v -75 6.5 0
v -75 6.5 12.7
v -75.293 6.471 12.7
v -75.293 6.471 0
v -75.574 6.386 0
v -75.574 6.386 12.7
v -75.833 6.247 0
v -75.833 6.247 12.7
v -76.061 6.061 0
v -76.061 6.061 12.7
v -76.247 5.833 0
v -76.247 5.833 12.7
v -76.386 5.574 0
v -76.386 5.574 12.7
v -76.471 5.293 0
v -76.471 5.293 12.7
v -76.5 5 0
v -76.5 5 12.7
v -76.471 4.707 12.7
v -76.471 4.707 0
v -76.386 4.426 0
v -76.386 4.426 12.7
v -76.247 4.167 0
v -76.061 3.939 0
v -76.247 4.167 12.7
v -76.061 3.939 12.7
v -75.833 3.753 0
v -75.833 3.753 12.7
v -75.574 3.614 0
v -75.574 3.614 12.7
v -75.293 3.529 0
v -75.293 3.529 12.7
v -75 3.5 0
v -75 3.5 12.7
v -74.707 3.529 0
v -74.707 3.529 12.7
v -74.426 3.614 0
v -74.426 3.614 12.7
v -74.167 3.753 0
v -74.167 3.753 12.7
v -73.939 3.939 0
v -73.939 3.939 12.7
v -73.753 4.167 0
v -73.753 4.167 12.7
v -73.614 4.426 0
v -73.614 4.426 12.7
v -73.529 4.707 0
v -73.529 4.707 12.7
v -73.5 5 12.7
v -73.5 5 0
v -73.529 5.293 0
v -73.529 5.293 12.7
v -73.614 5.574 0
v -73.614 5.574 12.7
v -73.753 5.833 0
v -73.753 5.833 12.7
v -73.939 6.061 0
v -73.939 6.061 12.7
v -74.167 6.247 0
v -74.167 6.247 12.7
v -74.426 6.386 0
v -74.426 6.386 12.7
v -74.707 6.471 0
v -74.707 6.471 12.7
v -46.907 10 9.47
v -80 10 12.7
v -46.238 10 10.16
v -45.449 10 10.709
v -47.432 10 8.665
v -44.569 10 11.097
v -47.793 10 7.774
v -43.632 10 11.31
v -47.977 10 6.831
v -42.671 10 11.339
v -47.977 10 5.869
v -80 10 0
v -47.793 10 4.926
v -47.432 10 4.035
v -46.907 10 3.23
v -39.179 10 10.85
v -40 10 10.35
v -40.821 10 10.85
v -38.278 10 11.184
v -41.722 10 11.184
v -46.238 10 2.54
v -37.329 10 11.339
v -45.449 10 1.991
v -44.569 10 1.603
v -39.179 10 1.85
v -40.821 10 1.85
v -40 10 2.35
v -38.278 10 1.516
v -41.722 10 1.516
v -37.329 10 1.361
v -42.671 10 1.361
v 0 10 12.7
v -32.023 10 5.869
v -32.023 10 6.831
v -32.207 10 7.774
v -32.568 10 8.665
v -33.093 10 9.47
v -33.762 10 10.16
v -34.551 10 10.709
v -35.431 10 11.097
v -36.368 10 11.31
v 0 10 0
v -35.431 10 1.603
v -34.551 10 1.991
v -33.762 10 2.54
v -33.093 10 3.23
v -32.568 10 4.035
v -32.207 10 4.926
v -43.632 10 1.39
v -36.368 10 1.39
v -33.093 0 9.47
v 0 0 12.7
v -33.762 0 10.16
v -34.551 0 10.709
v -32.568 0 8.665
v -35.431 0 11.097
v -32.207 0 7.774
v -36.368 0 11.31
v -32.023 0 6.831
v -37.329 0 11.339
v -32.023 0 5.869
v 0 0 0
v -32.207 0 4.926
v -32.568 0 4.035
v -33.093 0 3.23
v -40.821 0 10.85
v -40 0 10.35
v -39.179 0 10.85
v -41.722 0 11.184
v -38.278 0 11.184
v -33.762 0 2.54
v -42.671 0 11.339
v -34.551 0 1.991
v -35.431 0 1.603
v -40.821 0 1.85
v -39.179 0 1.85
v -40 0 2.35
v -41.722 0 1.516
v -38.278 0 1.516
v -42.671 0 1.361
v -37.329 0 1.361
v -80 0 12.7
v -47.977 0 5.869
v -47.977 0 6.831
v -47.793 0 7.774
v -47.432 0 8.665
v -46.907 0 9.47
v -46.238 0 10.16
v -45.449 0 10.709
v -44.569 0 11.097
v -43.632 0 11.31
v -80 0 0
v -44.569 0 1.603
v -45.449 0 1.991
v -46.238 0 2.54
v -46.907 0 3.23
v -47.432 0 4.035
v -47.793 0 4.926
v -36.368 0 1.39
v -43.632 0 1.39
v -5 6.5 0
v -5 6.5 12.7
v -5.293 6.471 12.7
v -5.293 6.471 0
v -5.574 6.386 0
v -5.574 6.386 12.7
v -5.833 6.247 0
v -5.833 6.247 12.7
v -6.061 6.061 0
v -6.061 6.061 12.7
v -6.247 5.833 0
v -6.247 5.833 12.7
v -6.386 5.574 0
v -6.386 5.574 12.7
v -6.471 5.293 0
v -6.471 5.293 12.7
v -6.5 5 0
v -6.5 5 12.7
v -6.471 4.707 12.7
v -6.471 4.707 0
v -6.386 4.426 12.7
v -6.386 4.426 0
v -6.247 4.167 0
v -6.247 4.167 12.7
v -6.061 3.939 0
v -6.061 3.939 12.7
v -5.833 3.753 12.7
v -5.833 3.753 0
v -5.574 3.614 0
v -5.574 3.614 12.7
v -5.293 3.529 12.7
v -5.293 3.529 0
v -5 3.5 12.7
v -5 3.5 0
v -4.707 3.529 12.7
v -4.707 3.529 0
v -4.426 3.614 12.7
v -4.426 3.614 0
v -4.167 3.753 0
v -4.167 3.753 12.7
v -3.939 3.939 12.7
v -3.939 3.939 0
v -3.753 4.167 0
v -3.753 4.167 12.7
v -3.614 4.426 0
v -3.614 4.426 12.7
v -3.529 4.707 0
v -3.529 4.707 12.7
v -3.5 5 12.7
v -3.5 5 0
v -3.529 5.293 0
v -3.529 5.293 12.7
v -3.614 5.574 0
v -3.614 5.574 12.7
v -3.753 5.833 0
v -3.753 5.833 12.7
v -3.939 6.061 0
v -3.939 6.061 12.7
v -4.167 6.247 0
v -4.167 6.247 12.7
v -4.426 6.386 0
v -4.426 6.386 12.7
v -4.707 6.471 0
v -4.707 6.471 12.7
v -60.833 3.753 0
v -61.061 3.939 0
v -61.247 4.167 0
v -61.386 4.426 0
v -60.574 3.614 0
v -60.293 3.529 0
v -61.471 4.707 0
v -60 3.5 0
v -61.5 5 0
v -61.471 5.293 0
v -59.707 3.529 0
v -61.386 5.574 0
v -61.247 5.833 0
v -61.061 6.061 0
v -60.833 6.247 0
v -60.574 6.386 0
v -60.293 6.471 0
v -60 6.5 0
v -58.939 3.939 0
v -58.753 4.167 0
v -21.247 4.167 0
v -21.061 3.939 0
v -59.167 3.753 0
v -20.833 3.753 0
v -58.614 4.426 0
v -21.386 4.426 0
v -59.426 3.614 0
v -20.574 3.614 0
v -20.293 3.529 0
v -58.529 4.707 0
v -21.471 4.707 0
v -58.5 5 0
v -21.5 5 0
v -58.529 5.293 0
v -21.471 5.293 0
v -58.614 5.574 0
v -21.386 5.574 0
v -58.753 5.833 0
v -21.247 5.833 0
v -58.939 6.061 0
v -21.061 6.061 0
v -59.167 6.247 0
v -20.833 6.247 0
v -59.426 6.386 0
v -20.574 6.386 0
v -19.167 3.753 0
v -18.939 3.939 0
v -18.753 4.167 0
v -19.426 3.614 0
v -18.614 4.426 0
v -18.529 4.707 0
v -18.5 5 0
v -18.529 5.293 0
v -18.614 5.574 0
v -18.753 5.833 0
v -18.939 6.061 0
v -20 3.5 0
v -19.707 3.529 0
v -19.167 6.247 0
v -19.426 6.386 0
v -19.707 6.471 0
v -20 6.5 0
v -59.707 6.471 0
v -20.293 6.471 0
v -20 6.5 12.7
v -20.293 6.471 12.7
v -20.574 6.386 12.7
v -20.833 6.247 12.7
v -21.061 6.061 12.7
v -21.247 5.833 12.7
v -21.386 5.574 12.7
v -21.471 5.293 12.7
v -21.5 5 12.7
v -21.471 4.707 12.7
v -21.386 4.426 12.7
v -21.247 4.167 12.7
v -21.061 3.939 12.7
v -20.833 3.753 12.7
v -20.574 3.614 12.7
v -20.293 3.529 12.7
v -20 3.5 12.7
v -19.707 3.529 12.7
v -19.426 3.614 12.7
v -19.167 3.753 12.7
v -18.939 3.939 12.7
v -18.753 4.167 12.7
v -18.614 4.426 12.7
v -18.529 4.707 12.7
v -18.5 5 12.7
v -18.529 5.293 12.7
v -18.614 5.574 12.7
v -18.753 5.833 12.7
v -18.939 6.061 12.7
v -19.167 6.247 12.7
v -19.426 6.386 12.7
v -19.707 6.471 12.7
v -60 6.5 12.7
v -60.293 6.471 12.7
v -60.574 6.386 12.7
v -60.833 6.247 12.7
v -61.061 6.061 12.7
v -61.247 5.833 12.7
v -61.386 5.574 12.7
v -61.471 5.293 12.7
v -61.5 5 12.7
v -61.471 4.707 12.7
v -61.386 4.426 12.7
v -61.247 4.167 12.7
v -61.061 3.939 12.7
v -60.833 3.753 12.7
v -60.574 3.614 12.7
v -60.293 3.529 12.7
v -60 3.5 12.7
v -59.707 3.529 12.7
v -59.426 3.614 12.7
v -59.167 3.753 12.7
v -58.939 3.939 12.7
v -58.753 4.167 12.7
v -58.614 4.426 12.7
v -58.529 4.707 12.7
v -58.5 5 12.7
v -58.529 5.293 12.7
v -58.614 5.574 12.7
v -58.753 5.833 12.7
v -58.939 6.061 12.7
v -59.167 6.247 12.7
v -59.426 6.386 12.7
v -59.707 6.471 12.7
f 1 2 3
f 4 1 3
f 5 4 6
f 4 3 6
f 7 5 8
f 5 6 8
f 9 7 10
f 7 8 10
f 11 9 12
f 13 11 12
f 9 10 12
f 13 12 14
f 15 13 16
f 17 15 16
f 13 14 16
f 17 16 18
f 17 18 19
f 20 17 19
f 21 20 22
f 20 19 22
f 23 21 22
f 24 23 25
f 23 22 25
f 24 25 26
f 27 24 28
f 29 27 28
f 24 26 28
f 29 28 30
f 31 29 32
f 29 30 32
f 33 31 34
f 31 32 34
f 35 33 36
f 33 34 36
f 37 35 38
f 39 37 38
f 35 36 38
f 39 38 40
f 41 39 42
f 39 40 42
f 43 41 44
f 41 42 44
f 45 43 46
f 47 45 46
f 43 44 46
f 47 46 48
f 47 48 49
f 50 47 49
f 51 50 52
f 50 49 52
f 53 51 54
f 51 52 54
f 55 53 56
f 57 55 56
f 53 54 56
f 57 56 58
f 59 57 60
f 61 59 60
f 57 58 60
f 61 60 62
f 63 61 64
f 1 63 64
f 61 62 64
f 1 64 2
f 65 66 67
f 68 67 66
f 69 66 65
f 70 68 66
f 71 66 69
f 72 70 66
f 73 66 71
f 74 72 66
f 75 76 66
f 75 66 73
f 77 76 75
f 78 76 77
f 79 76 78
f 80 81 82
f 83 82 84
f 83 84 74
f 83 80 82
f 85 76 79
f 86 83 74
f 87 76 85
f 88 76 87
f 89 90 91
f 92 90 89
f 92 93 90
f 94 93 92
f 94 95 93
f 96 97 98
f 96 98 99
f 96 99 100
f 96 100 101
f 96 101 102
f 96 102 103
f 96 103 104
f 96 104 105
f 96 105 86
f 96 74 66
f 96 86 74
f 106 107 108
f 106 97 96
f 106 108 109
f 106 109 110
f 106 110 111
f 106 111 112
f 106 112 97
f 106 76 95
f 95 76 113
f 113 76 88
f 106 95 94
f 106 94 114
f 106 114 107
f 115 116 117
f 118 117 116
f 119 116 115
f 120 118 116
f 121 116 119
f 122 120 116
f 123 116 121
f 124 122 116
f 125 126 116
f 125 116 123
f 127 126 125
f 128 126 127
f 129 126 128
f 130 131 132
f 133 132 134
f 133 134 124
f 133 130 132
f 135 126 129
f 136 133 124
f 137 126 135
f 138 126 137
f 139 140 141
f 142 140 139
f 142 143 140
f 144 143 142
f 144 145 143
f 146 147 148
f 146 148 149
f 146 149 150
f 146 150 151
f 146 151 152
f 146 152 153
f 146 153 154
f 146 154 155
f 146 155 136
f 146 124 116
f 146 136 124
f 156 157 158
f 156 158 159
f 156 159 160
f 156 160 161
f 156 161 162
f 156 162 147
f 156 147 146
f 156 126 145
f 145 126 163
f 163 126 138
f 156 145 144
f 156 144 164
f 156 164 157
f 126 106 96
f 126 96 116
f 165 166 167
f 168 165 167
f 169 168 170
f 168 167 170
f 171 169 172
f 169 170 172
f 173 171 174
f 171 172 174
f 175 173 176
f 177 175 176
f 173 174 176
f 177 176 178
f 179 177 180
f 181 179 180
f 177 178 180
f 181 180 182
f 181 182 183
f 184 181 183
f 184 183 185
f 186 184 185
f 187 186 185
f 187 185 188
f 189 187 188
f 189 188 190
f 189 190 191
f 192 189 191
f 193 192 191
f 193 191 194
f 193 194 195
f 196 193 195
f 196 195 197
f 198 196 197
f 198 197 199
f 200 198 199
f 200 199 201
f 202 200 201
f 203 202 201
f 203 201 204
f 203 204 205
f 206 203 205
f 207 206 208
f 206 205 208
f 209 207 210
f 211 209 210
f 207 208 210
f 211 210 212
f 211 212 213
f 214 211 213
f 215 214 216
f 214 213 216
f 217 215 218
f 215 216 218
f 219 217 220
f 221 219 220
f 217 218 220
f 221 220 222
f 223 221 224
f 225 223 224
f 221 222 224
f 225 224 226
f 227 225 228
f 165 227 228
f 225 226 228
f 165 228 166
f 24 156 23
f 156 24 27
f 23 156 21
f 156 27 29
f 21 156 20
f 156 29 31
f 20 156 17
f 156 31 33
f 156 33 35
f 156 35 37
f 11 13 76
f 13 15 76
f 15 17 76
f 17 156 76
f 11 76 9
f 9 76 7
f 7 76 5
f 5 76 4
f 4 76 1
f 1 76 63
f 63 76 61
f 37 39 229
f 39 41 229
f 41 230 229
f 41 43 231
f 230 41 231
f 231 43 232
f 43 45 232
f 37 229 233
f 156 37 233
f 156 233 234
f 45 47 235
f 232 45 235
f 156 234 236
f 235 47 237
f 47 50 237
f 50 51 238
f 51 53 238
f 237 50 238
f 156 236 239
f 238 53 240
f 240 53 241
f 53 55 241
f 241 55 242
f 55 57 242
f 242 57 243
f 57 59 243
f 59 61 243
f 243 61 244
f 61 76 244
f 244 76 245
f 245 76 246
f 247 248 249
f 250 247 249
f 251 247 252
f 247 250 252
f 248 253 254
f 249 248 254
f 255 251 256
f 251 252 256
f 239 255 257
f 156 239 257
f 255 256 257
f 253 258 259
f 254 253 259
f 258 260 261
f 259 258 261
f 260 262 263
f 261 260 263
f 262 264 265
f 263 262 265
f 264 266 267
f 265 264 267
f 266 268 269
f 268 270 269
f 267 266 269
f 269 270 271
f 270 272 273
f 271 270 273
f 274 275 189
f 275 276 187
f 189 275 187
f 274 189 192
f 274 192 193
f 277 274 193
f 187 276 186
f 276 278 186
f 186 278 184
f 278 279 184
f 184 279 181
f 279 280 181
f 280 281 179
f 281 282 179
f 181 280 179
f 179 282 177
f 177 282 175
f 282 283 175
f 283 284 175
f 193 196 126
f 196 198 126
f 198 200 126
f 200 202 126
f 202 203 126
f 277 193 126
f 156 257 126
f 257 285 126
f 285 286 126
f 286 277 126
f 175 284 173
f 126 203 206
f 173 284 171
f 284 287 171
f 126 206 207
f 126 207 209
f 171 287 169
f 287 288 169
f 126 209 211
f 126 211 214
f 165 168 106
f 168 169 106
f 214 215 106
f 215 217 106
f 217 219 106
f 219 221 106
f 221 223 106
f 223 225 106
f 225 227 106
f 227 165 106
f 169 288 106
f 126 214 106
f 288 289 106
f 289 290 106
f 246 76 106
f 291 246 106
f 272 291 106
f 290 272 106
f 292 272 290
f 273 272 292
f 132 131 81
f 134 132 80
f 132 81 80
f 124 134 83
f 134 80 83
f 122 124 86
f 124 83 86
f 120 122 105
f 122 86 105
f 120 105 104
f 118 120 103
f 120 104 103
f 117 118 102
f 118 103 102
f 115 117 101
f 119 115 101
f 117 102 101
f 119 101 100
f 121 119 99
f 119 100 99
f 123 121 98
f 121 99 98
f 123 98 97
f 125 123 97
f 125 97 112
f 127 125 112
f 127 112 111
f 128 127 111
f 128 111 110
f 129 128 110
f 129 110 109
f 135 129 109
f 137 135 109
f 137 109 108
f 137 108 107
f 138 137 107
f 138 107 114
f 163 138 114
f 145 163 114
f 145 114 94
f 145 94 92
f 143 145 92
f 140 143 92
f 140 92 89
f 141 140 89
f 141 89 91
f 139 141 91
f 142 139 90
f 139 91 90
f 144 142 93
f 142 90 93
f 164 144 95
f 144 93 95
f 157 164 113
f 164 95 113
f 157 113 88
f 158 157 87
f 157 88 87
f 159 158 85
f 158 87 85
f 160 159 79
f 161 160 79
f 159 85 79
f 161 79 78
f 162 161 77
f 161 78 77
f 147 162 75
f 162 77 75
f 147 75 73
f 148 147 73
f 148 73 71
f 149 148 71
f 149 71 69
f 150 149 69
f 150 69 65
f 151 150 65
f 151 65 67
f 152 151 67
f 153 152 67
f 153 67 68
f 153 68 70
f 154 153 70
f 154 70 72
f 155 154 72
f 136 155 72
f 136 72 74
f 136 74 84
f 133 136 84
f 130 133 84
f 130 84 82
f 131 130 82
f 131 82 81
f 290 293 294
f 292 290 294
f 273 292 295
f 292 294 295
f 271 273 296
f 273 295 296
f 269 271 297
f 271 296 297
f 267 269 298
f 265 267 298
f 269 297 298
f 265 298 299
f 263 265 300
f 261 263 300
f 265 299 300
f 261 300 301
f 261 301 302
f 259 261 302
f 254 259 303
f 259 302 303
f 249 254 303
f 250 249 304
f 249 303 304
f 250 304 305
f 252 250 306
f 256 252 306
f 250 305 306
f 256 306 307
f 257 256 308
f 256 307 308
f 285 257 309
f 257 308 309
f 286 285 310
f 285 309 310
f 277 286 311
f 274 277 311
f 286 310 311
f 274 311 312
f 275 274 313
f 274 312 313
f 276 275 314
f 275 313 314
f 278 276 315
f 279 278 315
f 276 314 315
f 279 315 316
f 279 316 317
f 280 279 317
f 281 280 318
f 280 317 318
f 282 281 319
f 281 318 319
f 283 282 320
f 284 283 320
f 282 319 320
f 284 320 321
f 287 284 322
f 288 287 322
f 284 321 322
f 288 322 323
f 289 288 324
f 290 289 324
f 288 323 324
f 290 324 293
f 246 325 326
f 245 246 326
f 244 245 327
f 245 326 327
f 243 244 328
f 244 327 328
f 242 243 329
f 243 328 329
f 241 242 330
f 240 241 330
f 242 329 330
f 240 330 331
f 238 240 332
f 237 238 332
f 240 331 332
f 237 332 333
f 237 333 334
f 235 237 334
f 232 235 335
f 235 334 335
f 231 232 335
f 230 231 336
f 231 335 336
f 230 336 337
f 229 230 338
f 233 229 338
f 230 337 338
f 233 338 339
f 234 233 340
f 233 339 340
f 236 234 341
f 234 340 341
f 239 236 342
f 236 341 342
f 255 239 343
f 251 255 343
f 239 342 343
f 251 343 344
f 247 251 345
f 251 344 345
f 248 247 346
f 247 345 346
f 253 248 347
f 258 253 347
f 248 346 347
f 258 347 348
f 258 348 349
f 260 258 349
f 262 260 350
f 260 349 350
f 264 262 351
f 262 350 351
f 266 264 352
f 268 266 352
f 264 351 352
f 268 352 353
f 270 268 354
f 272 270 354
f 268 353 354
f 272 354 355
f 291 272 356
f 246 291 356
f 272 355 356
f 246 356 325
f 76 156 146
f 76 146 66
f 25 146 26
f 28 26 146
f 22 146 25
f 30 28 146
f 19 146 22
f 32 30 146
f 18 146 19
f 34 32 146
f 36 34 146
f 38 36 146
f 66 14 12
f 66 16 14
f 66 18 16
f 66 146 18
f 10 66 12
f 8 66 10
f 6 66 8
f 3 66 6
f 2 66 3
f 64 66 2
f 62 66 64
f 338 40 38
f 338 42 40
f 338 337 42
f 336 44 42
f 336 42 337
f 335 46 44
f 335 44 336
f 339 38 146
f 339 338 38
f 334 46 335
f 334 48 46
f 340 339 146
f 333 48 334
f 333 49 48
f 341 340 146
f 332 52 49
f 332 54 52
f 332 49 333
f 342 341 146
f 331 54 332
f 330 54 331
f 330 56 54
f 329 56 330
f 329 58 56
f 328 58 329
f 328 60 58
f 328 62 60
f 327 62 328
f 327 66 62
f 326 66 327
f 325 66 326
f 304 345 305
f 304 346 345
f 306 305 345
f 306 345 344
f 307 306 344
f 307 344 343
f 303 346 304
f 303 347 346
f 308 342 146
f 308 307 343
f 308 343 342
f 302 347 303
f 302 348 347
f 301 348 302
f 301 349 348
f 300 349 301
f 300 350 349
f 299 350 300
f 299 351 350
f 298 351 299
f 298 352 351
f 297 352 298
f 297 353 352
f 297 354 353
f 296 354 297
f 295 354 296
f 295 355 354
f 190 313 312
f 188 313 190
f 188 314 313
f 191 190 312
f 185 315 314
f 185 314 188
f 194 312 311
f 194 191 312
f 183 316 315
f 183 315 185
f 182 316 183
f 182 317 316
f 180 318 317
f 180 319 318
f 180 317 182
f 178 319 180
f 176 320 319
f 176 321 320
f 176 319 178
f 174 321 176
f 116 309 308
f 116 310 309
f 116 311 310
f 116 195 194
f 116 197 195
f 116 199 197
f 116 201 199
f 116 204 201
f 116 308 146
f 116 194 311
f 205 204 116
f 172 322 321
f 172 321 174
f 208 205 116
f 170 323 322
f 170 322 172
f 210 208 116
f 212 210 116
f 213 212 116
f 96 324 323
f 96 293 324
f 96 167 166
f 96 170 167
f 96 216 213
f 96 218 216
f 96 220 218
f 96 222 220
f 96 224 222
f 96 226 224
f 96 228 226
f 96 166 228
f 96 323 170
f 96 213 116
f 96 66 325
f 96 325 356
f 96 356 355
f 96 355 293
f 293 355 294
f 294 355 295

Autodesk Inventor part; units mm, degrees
ref_plane "YZ Plane" through (0, 0, 0) normal (1, 0, 0) x (0, 1, 0)
ref_plane "XZ Plane" through (0, 0, 0) normal (0, 1, 0) x (-1, 0, 0)
ref_plane "XY Plane" through (0, 0, 0) normal (0, 0, 1) x (1, 0, 0)
sketch "Sketch1" plane through (0, 0, 0) normal (0, 0, 1) x (1, 0, 0)
  line L0 (-80, 10) -> (0, 10)
  line L1 (0, 10) -> (0, 0)
  line L2 (0, 0) -> (-80, 0)
  line L3 (-80, 0) -> (-80, 10)
  line L4 (-40, 0) -> (-40, 10) construction
  line L5 (-80, 5) -> (0, 5) construction
  point P0 (-75, 5)
  point P1 (-60, 5)
  point P2 (-5, 5)
  point P3 (-20, 5)
  dimension "load_cell_length" = 80
  dimension "load_cell_width" = 10
  dimension "load_cell_hole_inset" = 5
  dimension "load_cell_hole_spacing" = 15
extrude "Extrusion1" add sketch "Sketch1" along normal blind 12.7
hole "Hole1" at (-5, 5, 0) at (-20, 5, 0) at (-60, 5, 0) at (-75, 5, 0) direction (0, 0, 1) diameter 3 end through all
thread "Thread1" size "M3x0.5" class "6H" standard "ANSI Metric M Profile" full length
thread "Thread2" size "M3x0.5" class "6H" standard "ANSI Metric M Profile" full length
thread "Thread3" size "M3x0.5" class "6H" standard "ANSI Metric M Profile" full length
thread "Thread4" size "M3x0.5" class "6H" standard "ANSI Metric M Profile" full length
sketch "Sketch3" plane through (-80, 10, 0) normal (0, 1, 0) x (1, 0, 0)
  line L0 (80, 0) -> (0, 0) construction
  line L1 (0, 0) -> (0, -12.7) construction
  line L2 (80, -12.7) -> (0, -12.7) construction
  line L3 (80, 0) -> (80, -12.7) construction
  line L4 (0, -6.35) -> (80, -6.35)
  line L5 (40, -12.7) -> (40, 0)
  arc A0 (40, -2.35) -> (40, -10.35) centre (37, -6.35) ccw
  arc A1 (40, -10.35) -> (40, -2.35) centre (43, -6.35) ccw
  dimension "d23" = 10
  dimension "d24" = 6
extrude "Extrusion3" cut sketch "Sketch3" against normal blind 10
equation "\"d25\" = d23"
properties part number "load_cell"
